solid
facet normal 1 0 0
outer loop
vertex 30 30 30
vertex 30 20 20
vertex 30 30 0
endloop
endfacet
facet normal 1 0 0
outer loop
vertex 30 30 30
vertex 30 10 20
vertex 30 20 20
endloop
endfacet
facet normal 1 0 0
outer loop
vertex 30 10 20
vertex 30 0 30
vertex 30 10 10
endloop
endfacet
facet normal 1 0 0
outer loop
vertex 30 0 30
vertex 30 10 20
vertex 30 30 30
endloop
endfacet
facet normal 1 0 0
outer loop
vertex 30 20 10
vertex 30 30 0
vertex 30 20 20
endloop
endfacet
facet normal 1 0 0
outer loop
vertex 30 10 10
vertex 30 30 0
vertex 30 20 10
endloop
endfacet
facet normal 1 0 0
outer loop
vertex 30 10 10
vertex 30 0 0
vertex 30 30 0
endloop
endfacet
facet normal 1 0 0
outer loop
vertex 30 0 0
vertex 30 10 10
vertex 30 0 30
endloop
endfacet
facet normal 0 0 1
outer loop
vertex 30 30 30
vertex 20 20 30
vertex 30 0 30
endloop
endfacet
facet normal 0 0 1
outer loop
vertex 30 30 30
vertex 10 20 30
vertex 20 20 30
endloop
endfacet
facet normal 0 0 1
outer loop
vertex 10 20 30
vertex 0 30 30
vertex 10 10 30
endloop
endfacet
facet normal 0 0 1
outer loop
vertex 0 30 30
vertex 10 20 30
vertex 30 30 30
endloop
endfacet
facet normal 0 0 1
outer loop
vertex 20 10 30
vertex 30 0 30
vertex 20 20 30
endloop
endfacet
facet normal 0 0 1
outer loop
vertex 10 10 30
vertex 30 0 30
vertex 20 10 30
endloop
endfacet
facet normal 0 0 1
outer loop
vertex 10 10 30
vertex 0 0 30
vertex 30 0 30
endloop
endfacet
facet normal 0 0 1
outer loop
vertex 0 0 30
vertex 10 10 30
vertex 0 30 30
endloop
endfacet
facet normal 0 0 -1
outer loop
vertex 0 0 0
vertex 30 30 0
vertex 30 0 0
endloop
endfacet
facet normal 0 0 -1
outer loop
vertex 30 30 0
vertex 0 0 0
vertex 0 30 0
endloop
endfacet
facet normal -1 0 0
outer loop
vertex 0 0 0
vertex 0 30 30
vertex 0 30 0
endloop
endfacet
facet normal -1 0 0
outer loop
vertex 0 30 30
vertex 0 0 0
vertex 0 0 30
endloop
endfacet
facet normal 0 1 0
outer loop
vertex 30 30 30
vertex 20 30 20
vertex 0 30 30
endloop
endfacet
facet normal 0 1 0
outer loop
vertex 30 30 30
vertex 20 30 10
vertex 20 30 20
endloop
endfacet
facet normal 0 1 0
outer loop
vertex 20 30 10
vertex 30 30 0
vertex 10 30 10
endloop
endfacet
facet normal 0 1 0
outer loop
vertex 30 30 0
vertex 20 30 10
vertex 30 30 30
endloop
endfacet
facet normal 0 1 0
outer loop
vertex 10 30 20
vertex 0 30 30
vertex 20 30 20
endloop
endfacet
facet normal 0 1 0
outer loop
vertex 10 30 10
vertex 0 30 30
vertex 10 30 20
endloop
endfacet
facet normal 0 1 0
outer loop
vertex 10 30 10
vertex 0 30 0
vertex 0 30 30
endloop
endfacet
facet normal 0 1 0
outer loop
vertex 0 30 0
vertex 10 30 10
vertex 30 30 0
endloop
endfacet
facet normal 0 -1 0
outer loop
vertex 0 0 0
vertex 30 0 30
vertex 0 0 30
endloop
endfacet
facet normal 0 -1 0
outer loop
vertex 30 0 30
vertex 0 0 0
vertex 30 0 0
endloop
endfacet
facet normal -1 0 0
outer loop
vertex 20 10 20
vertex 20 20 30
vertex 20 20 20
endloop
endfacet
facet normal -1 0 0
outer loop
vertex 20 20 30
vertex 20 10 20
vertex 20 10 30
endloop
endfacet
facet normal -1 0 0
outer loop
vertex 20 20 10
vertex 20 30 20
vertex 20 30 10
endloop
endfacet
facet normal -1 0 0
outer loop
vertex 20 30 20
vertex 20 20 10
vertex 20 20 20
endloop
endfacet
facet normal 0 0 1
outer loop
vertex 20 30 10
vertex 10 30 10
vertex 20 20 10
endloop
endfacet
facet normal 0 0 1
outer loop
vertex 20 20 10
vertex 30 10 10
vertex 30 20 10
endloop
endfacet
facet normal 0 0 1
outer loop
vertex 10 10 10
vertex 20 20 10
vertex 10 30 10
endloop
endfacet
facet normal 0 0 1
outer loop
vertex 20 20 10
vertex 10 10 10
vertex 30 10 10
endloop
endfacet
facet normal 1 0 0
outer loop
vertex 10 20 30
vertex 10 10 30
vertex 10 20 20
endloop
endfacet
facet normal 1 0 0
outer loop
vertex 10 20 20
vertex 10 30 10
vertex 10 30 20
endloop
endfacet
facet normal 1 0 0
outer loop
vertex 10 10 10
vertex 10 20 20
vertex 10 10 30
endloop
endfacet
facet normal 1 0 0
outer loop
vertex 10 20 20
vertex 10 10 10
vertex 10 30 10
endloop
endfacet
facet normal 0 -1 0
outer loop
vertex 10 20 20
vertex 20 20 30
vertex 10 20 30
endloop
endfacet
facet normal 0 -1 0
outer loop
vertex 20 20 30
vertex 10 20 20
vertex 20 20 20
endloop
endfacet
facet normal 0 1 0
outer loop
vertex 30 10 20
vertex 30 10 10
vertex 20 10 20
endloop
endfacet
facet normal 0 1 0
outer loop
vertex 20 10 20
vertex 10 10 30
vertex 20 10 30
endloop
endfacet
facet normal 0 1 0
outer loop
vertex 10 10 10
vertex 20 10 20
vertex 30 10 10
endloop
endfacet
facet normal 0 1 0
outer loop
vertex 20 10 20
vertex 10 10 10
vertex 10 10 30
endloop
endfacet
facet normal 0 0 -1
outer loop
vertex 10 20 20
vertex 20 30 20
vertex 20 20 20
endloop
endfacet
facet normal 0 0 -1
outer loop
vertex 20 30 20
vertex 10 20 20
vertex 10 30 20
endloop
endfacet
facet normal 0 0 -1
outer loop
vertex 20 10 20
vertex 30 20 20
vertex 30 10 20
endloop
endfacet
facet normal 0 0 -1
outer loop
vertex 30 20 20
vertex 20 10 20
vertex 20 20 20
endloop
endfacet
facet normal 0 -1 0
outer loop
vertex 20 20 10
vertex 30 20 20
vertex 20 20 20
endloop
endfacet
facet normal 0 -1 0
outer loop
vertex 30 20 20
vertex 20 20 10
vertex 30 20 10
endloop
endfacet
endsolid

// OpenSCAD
difference()
{
    cube([30,30,30]);
    translate([10,10,10])
        cube([10,10,30]);
    translate([10,10,10])
        cube([10,30,10]);
     translate([10,10,10])
        cube([30,10,10]);
}
